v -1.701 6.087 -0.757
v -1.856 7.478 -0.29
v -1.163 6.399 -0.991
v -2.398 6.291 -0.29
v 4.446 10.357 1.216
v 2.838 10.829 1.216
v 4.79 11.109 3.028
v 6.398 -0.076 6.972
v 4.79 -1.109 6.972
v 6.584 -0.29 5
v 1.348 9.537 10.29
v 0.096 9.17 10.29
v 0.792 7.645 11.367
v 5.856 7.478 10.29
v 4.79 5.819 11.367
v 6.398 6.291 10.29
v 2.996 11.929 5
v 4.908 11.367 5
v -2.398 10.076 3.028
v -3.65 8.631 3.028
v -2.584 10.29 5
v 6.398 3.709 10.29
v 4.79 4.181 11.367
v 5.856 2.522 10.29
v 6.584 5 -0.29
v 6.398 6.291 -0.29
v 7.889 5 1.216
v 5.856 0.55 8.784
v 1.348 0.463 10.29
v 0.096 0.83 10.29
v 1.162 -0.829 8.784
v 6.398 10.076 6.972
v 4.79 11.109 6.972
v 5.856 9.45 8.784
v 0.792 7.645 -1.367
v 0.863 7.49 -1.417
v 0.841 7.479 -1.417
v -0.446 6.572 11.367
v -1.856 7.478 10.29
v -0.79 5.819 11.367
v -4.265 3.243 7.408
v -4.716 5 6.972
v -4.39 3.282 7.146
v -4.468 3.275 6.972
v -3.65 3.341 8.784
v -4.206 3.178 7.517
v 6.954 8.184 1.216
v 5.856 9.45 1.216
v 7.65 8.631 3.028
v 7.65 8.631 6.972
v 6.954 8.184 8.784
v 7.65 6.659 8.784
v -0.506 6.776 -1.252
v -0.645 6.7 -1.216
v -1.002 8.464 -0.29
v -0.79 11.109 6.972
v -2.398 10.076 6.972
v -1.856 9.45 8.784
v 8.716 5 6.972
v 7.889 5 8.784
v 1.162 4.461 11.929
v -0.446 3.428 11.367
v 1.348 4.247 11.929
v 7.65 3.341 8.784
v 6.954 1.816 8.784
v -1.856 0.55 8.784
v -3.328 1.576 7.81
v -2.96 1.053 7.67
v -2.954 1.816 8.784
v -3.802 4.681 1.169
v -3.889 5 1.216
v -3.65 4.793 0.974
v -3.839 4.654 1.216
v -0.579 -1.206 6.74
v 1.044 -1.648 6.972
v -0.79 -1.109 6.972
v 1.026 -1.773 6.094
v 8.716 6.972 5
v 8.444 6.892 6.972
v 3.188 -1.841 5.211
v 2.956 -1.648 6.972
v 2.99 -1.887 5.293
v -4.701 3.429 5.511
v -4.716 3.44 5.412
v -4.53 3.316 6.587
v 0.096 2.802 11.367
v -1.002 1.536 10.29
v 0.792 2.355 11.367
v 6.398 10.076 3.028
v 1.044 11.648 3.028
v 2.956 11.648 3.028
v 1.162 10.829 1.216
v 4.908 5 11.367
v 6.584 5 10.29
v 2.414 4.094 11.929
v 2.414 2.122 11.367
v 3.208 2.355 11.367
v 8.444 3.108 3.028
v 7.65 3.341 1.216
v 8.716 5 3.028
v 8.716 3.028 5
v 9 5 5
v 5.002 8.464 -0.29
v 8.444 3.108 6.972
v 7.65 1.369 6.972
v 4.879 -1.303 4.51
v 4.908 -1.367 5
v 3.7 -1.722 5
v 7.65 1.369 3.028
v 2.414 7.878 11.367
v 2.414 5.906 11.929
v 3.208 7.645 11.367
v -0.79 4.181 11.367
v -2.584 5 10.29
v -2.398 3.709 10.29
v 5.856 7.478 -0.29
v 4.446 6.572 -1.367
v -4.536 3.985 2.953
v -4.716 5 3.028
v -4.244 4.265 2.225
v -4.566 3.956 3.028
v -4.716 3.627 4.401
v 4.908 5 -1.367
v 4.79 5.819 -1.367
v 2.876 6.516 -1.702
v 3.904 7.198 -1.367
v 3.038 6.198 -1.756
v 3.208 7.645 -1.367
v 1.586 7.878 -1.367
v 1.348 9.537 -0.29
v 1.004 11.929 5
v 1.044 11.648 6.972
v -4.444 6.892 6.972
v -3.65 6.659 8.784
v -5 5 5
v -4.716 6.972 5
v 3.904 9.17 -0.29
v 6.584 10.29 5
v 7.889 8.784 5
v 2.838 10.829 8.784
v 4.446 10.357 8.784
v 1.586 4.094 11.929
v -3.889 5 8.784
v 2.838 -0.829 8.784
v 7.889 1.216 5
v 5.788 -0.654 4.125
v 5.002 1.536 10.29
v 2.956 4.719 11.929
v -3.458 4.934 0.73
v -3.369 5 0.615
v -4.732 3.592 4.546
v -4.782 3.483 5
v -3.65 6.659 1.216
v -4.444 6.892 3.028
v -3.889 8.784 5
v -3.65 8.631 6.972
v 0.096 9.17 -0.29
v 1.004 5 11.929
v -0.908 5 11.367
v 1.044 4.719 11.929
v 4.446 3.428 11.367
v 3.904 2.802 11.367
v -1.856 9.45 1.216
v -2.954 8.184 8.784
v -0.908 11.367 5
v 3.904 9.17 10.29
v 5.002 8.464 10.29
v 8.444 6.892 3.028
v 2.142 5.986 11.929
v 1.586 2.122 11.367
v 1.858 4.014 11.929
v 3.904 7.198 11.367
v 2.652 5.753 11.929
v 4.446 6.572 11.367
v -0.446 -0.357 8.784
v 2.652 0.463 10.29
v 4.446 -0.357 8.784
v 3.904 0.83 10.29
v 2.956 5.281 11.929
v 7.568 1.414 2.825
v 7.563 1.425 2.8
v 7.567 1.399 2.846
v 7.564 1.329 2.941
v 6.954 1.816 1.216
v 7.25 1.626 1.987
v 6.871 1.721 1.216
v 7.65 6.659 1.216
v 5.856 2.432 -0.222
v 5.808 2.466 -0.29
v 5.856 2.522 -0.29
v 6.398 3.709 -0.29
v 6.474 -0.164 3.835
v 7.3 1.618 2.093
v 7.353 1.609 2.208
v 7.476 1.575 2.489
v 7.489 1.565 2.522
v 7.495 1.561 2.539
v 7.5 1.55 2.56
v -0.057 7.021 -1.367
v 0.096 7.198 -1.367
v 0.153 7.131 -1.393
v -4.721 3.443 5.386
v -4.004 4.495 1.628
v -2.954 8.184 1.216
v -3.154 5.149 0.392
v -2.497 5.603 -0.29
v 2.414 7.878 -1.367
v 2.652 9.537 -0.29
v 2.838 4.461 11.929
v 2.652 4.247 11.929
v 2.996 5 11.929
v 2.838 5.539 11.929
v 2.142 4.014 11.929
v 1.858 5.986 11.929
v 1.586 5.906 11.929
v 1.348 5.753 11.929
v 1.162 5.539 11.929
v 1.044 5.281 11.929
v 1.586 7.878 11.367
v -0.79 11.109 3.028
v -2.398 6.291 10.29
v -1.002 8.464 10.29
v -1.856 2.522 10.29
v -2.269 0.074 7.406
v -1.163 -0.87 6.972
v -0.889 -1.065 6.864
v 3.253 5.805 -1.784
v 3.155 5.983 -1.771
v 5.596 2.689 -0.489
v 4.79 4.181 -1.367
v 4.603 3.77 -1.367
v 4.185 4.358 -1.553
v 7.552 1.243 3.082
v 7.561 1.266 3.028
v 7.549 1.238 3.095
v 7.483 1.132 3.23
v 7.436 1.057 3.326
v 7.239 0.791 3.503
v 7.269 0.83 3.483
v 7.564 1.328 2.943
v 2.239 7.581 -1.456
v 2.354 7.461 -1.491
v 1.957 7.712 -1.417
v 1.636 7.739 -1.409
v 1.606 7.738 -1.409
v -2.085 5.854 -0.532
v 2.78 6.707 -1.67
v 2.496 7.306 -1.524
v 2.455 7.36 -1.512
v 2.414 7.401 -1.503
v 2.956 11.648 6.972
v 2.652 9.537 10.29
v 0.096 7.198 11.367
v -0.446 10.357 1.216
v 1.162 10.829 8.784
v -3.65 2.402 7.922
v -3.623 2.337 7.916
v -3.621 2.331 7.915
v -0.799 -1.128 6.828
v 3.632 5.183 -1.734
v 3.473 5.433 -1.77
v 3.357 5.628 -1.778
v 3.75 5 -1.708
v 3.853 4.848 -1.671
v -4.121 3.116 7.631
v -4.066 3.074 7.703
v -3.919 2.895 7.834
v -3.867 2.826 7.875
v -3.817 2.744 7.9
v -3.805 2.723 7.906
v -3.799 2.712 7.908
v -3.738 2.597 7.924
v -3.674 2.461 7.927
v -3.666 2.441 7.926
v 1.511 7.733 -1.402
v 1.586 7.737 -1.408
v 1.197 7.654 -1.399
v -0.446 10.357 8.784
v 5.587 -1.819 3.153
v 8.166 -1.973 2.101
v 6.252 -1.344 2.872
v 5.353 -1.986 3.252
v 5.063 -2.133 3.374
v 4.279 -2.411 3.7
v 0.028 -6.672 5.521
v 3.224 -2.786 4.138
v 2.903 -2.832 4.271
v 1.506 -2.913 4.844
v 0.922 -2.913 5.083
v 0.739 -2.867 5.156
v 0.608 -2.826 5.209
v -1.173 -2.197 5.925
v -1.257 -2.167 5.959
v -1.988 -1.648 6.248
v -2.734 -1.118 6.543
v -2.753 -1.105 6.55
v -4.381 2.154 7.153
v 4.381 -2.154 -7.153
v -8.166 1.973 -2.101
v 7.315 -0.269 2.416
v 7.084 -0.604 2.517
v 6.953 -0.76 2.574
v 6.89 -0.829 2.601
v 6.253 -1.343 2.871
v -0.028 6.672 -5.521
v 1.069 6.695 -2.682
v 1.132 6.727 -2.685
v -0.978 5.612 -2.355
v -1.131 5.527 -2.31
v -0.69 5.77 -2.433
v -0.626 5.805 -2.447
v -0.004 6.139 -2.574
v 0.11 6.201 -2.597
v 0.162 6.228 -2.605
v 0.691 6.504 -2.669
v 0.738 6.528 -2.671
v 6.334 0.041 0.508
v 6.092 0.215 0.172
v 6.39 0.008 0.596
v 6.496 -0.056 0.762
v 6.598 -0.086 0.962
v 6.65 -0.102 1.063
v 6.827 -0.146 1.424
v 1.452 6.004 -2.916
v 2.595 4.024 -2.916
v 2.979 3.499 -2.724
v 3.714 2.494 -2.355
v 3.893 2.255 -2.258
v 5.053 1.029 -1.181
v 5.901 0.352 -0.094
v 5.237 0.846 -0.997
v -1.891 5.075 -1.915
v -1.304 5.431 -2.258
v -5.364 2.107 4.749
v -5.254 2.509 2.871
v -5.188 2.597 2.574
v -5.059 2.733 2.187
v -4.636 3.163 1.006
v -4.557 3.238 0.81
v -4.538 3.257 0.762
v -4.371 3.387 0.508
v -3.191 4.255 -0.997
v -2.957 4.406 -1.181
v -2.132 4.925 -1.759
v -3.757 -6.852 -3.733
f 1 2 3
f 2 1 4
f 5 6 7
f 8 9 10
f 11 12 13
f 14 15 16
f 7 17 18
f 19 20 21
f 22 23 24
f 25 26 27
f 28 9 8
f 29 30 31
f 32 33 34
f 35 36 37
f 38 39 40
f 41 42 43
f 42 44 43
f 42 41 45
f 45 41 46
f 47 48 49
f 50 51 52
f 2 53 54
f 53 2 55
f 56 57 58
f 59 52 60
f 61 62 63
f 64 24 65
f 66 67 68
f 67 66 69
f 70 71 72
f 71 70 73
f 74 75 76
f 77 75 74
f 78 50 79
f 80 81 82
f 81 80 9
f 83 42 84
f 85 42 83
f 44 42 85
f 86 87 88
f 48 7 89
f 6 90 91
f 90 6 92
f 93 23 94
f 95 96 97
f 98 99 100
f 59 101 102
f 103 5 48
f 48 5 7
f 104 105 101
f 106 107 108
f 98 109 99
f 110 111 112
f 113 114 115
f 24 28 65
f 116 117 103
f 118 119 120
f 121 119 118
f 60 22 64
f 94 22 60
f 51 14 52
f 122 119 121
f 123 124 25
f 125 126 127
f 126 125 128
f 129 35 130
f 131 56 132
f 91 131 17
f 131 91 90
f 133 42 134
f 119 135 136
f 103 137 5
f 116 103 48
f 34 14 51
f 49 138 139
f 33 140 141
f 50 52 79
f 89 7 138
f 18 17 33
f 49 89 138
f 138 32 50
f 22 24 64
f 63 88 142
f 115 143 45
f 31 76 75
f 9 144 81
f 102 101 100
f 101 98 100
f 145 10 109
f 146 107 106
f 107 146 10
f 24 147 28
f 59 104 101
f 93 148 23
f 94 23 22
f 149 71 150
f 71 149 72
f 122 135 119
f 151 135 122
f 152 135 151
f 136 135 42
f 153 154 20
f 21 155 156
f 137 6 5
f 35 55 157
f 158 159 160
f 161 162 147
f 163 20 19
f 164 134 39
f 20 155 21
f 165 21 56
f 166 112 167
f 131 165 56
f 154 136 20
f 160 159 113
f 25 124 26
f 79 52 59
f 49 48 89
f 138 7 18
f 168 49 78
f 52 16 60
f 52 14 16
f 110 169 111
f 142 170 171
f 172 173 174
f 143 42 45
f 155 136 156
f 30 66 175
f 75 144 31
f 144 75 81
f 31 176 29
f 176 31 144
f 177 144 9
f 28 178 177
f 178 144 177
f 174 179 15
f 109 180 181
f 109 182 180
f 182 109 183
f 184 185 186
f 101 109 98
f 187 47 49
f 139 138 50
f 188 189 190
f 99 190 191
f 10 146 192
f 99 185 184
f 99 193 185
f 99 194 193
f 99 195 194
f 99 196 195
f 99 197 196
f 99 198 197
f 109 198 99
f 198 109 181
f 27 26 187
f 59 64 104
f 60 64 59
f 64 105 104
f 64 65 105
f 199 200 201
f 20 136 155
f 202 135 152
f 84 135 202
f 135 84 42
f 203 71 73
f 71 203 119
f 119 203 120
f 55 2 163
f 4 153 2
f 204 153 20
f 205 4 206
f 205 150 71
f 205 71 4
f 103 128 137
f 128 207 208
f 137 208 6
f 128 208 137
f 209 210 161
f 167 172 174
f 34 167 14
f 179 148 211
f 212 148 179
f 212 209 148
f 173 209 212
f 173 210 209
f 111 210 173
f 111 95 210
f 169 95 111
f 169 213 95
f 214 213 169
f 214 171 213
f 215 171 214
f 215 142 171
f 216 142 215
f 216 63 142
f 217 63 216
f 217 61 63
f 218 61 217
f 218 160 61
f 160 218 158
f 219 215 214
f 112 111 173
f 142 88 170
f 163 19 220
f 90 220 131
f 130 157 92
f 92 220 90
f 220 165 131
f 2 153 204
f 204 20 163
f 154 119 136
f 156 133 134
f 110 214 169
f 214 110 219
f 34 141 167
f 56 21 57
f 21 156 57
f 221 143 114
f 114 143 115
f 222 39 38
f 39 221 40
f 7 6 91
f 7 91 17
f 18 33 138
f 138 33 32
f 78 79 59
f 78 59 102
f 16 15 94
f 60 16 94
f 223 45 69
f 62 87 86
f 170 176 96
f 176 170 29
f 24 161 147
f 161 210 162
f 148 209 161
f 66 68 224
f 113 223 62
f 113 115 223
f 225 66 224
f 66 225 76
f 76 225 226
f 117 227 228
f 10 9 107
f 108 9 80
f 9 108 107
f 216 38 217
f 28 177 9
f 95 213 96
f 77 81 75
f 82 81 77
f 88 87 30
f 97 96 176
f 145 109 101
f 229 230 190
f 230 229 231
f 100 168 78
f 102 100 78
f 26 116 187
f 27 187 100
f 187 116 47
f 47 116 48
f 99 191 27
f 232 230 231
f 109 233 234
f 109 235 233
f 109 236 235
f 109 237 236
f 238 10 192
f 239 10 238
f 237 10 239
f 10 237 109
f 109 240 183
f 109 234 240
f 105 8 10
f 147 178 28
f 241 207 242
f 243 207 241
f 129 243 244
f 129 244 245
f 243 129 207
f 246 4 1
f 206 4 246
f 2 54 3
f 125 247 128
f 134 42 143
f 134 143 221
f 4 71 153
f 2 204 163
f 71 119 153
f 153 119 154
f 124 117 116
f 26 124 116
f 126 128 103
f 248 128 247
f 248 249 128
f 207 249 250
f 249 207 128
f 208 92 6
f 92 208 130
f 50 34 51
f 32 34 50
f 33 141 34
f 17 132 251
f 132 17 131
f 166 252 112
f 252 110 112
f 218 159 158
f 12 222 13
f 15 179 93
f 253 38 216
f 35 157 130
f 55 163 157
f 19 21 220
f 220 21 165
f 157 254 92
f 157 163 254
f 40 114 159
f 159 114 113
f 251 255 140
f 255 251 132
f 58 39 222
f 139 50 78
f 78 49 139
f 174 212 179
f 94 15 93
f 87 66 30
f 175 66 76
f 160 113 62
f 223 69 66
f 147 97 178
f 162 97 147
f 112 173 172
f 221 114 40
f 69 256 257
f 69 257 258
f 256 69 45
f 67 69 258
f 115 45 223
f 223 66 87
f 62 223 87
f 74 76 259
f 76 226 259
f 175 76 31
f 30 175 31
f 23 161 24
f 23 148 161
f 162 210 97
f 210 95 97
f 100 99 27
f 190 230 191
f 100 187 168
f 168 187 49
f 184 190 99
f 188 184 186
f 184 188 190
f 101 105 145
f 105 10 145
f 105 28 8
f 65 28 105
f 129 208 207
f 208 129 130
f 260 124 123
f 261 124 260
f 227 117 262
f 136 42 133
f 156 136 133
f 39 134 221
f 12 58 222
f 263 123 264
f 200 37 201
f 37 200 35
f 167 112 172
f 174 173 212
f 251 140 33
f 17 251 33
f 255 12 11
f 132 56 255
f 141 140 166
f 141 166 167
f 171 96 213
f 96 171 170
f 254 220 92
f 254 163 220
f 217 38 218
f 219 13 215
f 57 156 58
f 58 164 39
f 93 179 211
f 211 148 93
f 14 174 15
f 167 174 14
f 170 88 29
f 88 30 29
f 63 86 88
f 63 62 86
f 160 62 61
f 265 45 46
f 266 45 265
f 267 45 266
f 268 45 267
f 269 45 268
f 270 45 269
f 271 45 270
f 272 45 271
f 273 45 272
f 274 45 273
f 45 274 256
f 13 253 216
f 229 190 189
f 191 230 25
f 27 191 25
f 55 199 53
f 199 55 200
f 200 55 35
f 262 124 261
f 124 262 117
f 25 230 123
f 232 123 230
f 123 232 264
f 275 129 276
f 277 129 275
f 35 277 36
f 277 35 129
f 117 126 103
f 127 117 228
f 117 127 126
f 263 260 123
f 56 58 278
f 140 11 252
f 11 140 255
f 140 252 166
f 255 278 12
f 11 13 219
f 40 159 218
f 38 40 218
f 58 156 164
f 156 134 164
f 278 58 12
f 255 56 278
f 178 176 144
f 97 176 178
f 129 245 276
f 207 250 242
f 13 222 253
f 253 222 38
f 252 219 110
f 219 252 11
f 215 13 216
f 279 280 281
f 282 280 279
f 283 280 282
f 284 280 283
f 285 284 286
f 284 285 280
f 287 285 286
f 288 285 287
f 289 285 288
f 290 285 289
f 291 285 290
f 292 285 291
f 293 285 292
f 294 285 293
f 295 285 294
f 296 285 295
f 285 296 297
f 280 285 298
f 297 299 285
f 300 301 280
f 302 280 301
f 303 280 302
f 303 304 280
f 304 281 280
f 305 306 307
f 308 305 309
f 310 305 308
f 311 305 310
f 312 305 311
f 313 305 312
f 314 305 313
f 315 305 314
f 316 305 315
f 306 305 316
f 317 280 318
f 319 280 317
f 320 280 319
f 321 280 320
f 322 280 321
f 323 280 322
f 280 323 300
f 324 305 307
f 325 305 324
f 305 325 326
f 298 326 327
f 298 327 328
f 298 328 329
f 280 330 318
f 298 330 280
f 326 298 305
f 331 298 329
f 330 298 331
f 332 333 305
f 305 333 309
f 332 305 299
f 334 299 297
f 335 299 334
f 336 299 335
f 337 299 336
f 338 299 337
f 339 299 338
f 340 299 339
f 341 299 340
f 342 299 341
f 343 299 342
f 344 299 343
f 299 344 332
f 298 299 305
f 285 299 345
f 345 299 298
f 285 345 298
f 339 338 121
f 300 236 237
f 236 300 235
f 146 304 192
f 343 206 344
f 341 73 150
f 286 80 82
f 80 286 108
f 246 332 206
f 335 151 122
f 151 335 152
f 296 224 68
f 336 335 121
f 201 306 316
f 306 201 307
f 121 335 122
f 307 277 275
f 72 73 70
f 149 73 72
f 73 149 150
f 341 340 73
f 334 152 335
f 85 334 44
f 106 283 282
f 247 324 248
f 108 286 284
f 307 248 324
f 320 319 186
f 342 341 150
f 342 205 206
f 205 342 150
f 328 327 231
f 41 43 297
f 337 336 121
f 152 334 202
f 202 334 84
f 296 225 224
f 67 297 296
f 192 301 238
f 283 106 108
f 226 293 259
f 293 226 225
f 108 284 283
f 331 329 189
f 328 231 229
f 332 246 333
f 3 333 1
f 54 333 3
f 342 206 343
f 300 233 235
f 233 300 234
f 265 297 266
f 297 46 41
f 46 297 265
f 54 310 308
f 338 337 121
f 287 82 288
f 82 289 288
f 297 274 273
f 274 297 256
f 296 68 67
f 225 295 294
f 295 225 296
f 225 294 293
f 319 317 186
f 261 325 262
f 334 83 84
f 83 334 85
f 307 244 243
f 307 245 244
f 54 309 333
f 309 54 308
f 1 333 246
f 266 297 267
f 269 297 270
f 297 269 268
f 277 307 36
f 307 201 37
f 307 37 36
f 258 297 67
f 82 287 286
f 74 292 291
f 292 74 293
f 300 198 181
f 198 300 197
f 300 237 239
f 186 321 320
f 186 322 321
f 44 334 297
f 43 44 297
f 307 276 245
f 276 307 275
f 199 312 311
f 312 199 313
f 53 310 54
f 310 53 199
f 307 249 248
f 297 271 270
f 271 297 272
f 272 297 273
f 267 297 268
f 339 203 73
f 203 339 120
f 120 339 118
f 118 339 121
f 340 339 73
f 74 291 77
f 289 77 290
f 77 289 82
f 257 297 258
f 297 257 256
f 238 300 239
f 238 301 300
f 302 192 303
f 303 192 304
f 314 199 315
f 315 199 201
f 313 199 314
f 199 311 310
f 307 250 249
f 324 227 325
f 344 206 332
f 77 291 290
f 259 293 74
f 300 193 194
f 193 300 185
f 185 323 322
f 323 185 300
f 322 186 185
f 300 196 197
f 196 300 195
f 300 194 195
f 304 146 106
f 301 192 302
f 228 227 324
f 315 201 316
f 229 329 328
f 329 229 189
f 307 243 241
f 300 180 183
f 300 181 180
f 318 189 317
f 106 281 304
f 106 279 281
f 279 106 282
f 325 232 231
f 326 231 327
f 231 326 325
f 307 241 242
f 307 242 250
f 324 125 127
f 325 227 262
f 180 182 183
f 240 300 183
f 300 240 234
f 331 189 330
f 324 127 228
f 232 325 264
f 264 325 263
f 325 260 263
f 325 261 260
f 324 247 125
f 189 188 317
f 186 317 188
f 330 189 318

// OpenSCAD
    ////////////////////////////////////////////////////////
    /*
    unionRound() dicovery 0.0  Module by Torleif Ceder - TLC123 late summer 2021
     Pretty fast Union with radius, But limited to a subset of cases
    Usage 
     unionRound( radius , detail , epsilon )
        {
         YourObject();
         YourObject(); 
        } 
    limitations: 
     0. Only really fast when boolean operands are convex, 
            Minkowski is fast in that case. 
     1. Boolean operands may be concave but can only touch 
            in a single convex area
     2. Radius is of elliptic type and is only approximate r
            were operand intersect at perpendicular angle. 
    */
    //////////////////////////////////////////////////////// 


unionRound(1, 1) {
    translate([2, 5, 5]) sphere(7);
     rotate([10, 20, 30]) cube(10, true);
}
module unionRound(r, detail = 1) {
    epsilon = 1e-6;
    children(0);
    children(1);
    step = 1 / detail;
    for (i = [0: step: 1 - step]) {
        {
            x = r - sin(i * 90) * r;
            y = r - cos(i * 90) * r;
            xi = r - sin((i + step) * 90) * r;
            yi = r - cos((i + step) * 90) * r;
            color(rands(0, 1, 3, i))
            hull() {
                intersection() {
                    // shell(epsilon) 
                    clad(x) children(0);
                    // shell(epsilon) 
                    clad(y) children(1);
                }
                intersection() {
                    // shell(epsilon) 
                    clad(xi) children(0);
                    // shell(epsilon) 
                    clad(yi) children(1);
                }
            }
        }
    }
}
// unionRound helper expand by r
module clad(r) {
    minkowski() {
        children();
        //        icosphere(r,2);
        sphere(r, $fn = 19.5);
    }
}
// unionRound helper
module shell(r) {
    difference() {
        clad(r) children();
        children();
    }
}
